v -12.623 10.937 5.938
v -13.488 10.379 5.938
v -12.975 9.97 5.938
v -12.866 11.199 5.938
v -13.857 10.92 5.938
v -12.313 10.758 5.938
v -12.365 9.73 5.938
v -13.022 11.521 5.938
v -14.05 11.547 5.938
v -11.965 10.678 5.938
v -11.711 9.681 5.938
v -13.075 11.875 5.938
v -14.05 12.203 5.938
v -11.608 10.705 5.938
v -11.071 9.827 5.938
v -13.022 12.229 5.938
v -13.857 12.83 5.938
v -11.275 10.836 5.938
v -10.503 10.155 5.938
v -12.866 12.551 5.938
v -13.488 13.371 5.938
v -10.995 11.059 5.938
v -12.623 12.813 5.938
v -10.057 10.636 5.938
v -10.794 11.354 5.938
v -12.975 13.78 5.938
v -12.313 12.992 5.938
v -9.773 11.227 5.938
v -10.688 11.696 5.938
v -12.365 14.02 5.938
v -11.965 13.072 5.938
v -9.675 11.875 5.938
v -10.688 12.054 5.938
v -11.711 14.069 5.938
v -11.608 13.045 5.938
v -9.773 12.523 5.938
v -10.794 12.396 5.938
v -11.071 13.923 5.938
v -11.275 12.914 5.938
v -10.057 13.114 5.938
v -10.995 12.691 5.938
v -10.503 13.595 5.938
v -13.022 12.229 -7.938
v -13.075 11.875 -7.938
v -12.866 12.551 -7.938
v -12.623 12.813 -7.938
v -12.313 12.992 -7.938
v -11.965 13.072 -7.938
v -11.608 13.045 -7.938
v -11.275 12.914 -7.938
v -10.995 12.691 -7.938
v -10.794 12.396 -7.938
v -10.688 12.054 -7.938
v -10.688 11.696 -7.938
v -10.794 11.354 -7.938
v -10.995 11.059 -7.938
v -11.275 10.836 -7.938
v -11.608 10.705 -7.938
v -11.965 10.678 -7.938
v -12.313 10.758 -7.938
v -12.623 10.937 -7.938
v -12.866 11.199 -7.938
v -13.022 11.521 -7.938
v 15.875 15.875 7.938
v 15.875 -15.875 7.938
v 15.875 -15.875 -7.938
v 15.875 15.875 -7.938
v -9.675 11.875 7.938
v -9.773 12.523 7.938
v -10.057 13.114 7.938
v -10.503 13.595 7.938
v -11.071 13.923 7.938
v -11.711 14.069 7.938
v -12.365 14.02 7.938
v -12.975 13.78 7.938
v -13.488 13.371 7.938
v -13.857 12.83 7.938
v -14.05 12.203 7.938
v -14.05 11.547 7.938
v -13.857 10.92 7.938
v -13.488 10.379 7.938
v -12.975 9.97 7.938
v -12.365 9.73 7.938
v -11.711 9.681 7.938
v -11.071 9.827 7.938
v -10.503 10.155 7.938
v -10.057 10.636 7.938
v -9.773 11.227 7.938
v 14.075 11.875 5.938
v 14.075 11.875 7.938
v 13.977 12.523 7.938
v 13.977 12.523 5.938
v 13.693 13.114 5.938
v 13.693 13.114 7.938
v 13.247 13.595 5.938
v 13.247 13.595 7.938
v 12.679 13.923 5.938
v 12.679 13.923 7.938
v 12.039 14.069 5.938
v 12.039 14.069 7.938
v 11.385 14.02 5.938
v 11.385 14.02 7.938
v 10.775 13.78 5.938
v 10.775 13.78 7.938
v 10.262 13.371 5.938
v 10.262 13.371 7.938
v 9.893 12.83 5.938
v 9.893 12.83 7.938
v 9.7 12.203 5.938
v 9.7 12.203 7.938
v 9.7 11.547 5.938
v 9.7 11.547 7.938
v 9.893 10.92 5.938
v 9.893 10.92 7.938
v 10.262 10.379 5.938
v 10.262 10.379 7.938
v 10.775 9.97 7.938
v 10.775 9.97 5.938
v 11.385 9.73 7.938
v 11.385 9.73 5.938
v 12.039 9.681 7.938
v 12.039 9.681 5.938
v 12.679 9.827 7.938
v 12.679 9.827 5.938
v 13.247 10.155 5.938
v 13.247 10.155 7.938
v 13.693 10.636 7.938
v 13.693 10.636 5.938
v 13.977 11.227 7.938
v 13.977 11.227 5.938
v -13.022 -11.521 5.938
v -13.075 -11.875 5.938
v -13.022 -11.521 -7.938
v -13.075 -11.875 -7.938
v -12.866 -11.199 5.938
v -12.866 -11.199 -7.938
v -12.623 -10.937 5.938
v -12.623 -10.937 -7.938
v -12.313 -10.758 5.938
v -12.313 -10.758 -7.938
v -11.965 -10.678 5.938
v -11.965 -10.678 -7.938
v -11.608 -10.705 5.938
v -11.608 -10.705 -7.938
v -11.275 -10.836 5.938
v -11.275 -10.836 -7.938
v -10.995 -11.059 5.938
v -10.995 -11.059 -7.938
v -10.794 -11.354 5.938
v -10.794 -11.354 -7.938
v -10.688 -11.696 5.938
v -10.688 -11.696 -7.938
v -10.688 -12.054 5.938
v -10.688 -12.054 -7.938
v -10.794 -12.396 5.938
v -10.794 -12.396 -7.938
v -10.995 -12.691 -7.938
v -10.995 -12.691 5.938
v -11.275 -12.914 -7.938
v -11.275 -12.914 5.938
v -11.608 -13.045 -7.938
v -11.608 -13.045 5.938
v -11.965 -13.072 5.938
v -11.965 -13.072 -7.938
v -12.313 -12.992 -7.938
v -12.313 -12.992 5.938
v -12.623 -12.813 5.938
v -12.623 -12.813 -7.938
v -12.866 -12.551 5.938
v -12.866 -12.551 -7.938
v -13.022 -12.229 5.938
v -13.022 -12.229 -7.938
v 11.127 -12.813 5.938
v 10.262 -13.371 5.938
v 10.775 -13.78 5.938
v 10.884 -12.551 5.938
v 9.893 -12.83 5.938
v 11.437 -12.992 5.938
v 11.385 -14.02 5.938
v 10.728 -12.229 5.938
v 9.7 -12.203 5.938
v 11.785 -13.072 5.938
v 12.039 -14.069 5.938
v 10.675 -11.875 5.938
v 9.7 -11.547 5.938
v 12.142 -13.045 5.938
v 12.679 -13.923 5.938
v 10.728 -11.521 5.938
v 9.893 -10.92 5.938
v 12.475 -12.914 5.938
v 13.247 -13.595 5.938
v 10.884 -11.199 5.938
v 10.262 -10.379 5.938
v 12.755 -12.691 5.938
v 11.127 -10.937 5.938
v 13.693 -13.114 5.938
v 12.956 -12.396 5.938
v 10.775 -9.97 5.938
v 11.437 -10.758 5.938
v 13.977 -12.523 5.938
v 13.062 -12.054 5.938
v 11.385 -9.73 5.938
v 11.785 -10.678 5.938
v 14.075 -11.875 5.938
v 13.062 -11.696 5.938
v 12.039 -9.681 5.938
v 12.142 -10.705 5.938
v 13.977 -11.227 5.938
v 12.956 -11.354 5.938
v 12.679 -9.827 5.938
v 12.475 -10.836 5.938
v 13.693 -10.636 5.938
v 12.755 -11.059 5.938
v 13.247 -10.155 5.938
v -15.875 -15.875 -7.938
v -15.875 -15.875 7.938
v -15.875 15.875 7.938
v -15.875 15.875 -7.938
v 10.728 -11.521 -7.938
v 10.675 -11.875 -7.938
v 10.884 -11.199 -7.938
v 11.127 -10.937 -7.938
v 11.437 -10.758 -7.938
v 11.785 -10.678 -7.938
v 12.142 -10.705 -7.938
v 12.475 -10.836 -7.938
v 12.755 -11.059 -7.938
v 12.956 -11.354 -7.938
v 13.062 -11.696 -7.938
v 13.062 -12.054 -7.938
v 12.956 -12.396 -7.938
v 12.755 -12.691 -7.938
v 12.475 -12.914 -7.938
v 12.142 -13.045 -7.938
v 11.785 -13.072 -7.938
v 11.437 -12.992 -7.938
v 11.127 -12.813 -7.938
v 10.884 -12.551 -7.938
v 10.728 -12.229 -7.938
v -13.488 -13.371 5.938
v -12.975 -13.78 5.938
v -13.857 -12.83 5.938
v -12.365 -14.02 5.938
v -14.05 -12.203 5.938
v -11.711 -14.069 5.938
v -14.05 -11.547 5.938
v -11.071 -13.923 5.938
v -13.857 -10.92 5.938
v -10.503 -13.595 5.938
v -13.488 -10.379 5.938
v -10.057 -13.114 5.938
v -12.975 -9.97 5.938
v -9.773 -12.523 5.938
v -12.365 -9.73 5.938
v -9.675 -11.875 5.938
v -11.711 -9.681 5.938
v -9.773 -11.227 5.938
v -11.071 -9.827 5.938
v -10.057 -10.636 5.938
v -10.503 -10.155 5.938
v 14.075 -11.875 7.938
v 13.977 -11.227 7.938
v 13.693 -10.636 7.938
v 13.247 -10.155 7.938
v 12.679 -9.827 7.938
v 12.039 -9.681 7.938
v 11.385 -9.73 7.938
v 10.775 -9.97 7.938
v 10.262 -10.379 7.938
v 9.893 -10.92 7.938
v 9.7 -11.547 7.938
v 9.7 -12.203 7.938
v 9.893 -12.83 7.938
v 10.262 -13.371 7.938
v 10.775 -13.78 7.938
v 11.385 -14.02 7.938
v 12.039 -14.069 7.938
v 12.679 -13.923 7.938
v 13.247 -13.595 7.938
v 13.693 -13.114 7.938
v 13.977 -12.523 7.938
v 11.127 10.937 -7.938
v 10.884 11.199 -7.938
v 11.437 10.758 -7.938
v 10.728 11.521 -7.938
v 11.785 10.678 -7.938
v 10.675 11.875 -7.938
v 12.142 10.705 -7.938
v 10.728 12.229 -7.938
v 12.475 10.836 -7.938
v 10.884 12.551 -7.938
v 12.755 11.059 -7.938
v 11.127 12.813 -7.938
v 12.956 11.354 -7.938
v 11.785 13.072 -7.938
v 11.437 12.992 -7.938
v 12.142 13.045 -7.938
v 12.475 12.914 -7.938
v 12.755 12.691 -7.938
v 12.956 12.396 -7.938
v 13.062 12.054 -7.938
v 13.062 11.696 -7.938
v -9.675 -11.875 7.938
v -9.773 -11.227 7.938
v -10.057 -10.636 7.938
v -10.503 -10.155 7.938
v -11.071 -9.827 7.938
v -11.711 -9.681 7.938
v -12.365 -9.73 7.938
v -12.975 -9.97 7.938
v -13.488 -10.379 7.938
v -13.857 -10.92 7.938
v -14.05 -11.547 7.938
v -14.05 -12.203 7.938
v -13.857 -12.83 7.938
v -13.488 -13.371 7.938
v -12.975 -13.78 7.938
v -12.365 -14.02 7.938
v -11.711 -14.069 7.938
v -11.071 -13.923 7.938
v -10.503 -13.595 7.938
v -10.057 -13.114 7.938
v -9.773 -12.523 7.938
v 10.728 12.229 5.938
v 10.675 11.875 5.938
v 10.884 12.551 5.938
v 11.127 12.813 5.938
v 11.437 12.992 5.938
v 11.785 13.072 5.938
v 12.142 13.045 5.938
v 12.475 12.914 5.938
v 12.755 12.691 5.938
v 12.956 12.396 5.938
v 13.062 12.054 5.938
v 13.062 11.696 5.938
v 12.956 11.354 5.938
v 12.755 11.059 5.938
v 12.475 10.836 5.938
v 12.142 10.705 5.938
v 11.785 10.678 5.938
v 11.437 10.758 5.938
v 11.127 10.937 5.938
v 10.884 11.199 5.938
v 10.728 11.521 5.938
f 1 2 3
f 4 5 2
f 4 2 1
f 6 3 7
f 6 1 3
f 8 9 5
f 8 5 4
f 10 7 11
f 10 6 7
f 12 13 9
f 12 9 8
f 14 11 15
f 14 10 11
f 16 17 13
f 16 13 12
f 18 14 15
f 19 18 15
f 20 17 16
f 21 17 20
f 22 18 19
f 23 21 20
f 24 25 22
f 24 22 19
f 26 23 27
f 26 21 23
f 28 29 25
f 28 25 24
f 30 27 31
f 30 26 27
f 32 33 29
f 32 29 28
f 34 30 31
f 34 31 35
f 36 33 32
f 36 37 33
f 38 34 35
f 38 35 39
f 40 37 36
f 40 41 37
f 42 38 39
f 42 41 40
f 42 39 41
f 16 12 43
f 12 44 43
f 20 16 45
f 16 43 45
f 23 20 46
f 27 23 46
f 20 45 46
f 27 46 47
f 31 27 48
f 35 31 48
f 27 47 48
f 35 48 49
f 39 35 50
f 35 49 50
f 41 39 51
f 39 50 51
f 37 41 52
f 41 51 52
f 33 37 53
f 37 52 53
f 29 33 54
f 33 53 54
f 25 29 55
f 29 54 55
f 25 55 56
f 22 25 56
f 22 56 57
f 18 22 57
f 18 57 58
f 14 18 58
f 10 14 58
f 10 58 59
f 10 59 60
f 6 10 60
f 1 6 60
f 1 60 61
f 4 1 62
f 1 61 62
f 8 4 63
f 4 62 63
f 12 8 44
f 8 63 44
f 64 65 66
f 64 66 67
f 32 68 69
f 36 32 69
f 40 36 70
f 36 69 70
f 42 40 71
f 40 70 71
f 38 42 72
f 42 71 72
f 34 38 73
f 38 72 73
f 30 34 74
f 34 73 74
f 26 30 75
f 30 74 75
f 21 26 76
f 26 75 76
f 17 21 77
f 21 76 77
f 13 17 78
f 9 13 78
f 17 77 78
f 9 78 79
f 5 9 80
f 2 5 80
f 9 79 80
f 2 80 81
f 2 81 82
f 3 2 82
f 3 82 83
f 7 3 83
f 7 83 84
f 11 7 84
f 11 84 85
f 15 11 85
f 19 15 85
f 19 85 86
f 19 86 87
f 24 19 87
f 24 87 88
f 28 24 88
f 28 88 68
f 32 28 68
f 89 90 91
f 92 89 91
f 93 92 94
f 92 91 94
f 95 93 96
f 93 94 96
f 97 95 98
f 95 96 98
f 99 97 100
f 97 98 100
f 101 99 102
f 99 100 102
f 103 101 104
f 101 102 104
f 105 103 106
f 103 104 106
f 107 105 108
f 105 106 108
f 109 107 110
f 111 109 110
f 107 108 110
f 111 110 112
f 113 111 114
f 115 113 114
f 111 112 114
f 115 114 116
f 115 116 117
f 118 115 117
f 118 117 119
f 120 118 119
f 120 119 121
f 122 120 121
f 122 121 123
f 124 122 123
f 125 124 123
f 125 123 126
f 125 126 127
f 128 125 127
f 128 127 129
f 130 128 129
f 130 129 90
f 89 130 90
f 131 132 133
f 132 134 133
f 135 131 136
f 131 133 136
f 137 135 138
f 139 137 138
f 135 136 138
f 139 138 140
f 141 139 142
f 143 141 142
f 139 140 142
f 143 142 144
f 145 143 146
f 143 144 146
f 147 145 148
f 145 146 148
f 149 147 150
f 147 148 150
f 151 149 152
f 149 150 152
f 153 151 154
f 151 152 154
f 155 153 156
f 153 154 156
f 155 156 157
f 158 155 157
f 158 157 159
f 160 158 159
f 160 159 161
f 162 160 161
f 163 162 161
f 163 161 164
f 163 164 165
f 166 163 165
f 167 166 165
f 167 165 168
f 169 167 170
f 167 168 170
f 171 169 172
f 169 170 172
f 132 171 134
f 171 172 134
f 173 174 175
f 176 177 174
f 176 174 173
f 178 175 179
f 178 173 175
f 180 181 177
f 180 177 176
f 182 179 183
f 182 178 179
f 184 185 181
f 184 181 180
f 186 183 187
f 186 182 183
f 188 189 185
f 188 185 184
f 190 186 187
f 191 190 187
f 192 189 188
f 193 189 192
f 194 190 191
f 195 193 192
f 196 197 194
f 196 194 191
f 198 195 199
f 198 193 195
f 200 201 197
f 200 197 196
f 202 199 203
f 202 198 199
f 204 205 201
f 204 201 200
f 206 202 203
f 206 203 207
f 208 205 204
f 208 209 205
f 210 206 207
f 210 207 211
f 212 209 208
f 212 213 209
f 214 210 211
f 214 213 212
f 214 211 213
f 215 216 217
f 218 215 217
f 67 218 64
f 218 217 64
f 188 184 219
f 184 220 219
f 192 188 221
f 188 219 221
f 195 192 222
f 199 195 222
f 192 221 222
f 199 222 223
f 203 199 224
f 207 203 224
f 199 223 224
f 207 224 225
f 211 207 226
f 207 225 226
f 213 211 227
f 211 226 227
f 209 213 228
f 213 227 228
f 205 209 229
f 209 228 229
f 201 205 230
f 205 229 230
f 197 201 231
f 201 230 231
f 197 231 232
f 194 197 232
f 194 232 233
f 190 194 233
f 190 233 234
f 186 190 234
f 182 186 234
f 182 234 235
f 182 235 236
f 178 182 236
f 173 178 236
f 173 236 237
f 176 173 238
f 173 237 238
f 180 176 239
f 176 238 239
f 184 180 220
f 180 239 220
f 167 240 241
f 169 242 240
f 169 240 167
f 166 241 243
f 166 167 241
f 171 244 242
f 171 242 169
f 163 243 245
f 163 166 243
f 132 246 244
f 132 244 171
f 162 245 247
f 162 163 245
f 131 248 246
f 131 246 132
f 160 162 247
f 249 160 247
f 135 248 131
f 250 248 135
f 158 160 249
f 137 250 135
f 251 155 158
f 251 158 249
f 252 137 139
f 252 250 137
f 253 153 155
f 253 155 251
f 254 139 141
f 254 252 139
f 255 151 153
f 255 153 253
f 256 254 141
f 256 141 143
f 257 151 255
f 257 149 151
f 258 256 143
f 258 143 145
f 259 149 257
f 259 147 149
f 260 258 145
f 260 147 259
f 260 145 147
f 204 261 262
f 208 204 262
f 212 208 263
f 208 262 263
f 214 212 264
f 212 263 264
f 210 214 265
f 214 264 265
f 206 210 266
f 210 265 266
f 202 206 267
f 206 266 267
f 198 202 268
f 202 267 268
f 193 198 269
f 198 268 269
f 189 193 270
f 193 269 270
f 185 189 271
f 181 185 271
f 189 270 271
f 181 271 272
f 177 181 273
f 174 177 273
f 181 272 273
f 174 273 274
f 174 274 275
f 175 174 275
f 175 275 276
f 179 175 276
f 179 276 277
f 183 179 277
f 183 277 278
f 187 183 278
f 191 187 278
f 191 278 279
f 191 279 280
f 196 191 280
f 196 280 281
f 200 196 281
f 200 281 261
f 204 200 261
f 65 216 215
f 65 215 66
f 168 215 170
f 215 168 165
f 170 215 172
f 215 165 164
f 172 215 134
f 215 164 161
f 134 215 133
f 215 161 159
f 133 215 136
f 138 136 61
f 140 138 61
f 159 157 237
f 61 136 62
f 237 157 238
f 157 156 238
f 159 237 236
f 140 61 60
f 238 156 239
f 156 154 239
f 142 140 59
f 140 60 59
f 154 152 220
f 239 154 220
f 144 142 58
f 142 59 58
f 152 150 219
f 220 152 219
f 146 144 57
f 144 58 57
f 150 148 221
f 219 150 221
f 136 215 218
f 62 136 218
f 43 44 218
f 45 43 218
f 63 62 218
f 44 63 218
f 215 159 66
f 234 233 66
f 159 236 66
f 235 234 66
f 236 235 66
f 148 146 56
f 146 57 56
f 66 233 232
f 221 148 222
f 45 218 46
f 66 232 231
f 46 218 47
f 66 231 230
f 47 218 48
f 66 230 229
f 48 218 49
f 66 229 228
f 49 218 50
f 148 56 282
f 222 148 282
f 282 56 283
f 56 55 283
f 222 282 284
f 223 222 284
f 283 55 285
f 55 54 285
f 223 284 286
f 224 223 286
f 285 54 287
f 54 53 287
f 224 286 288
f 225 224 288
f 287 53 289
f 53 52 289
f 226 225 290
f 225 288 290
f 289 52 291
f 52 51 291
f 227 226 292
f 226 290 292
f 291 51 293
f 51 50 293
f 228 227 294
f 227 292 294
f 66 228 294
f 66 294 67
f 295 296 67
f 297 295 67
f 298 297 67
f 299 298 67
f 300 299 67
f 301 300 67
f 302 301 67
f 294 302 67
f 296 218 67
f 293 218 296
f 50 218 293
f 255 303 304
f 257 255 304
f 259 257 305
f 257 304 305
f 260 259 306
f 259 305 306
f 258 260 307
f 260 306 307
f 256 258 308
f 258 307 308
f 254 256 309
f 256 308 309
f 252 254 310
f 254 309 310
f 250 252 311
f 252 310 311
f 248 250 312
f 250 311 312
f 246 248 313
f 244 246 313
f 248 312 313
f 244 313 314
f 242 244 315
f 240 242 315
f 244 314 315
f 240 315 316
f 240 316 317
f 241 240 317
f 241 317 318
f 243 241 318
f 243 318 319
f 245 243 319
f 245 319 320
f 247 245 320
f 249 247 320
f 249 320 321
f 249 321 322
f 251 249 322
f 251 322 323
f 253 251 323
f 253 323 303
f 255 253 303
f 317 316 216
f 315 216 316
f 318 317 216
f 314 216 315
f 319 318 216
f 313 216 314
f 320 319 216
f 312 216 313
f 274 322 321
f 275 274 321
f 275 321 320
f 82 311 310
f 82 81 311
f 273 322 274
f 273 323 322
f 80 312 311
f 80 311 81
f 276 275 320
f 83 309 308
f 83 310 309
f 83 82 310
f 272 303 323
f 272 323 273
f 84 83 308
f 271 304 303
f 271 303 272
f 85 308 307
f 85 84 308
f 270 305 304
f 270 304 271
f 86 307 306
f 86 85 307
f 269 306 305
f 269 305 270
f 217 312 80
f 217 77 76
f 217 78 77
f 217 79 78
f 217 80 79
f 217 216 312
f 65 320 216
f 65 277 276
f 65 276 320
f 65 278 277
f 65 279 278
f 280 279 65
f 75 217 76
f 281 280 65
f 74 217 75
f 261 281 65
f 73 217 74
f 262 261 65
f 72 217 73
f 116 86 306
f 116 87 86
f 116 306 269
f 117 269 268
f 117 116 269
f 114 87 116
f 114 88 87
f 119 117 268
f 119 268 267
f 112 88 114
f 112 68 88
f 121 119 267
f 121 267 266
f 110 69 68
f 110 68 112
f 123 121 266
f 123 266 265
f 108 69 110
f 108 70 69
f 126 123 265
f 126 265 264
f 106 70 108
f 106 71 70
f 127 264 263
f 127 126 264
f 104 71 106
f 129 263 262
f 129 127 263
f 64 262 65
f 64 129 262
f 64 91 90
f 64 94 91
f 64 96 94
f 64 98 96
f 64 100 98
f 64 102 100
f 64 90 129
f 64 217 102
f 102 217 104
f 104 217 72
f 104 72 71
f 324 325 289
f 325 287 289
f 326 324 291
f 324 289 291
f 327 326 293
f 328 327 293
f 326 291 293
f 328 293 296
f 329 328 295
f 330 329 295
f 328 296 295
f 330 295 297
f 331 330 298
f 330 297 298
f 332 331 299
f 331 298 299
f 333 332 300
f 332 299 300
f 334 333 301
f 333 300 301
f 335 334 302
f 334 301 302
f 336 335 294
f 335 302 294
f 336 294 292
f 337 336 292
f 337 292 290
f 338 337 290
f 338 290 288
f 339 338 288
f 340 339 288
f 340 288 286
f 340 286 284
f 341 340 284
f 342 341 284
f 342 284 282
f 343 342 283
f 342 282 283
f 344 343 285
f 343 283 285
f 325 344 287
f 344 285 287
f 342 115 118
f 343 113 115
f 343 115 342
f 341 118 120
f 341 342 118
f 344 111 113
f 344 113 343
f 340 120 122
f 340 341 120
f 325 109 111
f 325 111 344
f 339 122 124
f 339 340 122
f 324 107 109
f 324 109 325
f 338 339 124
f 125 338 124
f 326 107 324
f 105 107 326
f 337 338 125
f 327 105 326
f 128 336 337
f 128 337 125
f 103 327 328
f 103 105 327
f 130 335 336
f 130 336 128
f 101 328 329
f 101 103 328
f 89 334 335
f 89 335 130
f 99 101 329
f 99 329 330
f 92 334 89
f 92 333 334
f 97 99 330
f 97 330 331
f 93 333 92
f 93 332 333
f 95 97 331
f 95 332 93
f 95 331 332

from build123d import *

# Parameters (mm, degrees)
SKETCH1_W                      = 31.75
SKETCH1_H                      = 31.75
BOSS_EXTRUDE1_DEPTH            = 7.9375
CBORE_FOR_M2_SHCS1_D           = 2.4
CBORE_FOR_M2_SHCS1_CBORE_D     = 4.4
CBORE_FOR_M2_SHCS1_CBORE_DEPTH = 2


with BuildPart() as part:
    # Sketch1 → Boss-Extrude1 (new body, symmetric)
    with BuildSketch(Plane.XY):
        Rectangle(SKETCH1_W, SKETCH1_H)
    extrude(amount=BOSS_EXTRUDE1_DEPTH, both=True)

    # CBORE for M2 SHCS1 (through all)
    with Locations(Plane.XY.offset(7.9375)):
        with Locations((-11.875, 11.875), (11.875, 11.875), (11.875, -11.875), (-11.875, -11.875)):
            CounterBoreHole(CBORE_FOR_M2_SHCS1_D / 2, CBORE_FOR_M2_SHCS1_CBORE_D / 2, CBORE_FOR_M2_SHCS1_CBORE_DEPTH)


solid = part.part
